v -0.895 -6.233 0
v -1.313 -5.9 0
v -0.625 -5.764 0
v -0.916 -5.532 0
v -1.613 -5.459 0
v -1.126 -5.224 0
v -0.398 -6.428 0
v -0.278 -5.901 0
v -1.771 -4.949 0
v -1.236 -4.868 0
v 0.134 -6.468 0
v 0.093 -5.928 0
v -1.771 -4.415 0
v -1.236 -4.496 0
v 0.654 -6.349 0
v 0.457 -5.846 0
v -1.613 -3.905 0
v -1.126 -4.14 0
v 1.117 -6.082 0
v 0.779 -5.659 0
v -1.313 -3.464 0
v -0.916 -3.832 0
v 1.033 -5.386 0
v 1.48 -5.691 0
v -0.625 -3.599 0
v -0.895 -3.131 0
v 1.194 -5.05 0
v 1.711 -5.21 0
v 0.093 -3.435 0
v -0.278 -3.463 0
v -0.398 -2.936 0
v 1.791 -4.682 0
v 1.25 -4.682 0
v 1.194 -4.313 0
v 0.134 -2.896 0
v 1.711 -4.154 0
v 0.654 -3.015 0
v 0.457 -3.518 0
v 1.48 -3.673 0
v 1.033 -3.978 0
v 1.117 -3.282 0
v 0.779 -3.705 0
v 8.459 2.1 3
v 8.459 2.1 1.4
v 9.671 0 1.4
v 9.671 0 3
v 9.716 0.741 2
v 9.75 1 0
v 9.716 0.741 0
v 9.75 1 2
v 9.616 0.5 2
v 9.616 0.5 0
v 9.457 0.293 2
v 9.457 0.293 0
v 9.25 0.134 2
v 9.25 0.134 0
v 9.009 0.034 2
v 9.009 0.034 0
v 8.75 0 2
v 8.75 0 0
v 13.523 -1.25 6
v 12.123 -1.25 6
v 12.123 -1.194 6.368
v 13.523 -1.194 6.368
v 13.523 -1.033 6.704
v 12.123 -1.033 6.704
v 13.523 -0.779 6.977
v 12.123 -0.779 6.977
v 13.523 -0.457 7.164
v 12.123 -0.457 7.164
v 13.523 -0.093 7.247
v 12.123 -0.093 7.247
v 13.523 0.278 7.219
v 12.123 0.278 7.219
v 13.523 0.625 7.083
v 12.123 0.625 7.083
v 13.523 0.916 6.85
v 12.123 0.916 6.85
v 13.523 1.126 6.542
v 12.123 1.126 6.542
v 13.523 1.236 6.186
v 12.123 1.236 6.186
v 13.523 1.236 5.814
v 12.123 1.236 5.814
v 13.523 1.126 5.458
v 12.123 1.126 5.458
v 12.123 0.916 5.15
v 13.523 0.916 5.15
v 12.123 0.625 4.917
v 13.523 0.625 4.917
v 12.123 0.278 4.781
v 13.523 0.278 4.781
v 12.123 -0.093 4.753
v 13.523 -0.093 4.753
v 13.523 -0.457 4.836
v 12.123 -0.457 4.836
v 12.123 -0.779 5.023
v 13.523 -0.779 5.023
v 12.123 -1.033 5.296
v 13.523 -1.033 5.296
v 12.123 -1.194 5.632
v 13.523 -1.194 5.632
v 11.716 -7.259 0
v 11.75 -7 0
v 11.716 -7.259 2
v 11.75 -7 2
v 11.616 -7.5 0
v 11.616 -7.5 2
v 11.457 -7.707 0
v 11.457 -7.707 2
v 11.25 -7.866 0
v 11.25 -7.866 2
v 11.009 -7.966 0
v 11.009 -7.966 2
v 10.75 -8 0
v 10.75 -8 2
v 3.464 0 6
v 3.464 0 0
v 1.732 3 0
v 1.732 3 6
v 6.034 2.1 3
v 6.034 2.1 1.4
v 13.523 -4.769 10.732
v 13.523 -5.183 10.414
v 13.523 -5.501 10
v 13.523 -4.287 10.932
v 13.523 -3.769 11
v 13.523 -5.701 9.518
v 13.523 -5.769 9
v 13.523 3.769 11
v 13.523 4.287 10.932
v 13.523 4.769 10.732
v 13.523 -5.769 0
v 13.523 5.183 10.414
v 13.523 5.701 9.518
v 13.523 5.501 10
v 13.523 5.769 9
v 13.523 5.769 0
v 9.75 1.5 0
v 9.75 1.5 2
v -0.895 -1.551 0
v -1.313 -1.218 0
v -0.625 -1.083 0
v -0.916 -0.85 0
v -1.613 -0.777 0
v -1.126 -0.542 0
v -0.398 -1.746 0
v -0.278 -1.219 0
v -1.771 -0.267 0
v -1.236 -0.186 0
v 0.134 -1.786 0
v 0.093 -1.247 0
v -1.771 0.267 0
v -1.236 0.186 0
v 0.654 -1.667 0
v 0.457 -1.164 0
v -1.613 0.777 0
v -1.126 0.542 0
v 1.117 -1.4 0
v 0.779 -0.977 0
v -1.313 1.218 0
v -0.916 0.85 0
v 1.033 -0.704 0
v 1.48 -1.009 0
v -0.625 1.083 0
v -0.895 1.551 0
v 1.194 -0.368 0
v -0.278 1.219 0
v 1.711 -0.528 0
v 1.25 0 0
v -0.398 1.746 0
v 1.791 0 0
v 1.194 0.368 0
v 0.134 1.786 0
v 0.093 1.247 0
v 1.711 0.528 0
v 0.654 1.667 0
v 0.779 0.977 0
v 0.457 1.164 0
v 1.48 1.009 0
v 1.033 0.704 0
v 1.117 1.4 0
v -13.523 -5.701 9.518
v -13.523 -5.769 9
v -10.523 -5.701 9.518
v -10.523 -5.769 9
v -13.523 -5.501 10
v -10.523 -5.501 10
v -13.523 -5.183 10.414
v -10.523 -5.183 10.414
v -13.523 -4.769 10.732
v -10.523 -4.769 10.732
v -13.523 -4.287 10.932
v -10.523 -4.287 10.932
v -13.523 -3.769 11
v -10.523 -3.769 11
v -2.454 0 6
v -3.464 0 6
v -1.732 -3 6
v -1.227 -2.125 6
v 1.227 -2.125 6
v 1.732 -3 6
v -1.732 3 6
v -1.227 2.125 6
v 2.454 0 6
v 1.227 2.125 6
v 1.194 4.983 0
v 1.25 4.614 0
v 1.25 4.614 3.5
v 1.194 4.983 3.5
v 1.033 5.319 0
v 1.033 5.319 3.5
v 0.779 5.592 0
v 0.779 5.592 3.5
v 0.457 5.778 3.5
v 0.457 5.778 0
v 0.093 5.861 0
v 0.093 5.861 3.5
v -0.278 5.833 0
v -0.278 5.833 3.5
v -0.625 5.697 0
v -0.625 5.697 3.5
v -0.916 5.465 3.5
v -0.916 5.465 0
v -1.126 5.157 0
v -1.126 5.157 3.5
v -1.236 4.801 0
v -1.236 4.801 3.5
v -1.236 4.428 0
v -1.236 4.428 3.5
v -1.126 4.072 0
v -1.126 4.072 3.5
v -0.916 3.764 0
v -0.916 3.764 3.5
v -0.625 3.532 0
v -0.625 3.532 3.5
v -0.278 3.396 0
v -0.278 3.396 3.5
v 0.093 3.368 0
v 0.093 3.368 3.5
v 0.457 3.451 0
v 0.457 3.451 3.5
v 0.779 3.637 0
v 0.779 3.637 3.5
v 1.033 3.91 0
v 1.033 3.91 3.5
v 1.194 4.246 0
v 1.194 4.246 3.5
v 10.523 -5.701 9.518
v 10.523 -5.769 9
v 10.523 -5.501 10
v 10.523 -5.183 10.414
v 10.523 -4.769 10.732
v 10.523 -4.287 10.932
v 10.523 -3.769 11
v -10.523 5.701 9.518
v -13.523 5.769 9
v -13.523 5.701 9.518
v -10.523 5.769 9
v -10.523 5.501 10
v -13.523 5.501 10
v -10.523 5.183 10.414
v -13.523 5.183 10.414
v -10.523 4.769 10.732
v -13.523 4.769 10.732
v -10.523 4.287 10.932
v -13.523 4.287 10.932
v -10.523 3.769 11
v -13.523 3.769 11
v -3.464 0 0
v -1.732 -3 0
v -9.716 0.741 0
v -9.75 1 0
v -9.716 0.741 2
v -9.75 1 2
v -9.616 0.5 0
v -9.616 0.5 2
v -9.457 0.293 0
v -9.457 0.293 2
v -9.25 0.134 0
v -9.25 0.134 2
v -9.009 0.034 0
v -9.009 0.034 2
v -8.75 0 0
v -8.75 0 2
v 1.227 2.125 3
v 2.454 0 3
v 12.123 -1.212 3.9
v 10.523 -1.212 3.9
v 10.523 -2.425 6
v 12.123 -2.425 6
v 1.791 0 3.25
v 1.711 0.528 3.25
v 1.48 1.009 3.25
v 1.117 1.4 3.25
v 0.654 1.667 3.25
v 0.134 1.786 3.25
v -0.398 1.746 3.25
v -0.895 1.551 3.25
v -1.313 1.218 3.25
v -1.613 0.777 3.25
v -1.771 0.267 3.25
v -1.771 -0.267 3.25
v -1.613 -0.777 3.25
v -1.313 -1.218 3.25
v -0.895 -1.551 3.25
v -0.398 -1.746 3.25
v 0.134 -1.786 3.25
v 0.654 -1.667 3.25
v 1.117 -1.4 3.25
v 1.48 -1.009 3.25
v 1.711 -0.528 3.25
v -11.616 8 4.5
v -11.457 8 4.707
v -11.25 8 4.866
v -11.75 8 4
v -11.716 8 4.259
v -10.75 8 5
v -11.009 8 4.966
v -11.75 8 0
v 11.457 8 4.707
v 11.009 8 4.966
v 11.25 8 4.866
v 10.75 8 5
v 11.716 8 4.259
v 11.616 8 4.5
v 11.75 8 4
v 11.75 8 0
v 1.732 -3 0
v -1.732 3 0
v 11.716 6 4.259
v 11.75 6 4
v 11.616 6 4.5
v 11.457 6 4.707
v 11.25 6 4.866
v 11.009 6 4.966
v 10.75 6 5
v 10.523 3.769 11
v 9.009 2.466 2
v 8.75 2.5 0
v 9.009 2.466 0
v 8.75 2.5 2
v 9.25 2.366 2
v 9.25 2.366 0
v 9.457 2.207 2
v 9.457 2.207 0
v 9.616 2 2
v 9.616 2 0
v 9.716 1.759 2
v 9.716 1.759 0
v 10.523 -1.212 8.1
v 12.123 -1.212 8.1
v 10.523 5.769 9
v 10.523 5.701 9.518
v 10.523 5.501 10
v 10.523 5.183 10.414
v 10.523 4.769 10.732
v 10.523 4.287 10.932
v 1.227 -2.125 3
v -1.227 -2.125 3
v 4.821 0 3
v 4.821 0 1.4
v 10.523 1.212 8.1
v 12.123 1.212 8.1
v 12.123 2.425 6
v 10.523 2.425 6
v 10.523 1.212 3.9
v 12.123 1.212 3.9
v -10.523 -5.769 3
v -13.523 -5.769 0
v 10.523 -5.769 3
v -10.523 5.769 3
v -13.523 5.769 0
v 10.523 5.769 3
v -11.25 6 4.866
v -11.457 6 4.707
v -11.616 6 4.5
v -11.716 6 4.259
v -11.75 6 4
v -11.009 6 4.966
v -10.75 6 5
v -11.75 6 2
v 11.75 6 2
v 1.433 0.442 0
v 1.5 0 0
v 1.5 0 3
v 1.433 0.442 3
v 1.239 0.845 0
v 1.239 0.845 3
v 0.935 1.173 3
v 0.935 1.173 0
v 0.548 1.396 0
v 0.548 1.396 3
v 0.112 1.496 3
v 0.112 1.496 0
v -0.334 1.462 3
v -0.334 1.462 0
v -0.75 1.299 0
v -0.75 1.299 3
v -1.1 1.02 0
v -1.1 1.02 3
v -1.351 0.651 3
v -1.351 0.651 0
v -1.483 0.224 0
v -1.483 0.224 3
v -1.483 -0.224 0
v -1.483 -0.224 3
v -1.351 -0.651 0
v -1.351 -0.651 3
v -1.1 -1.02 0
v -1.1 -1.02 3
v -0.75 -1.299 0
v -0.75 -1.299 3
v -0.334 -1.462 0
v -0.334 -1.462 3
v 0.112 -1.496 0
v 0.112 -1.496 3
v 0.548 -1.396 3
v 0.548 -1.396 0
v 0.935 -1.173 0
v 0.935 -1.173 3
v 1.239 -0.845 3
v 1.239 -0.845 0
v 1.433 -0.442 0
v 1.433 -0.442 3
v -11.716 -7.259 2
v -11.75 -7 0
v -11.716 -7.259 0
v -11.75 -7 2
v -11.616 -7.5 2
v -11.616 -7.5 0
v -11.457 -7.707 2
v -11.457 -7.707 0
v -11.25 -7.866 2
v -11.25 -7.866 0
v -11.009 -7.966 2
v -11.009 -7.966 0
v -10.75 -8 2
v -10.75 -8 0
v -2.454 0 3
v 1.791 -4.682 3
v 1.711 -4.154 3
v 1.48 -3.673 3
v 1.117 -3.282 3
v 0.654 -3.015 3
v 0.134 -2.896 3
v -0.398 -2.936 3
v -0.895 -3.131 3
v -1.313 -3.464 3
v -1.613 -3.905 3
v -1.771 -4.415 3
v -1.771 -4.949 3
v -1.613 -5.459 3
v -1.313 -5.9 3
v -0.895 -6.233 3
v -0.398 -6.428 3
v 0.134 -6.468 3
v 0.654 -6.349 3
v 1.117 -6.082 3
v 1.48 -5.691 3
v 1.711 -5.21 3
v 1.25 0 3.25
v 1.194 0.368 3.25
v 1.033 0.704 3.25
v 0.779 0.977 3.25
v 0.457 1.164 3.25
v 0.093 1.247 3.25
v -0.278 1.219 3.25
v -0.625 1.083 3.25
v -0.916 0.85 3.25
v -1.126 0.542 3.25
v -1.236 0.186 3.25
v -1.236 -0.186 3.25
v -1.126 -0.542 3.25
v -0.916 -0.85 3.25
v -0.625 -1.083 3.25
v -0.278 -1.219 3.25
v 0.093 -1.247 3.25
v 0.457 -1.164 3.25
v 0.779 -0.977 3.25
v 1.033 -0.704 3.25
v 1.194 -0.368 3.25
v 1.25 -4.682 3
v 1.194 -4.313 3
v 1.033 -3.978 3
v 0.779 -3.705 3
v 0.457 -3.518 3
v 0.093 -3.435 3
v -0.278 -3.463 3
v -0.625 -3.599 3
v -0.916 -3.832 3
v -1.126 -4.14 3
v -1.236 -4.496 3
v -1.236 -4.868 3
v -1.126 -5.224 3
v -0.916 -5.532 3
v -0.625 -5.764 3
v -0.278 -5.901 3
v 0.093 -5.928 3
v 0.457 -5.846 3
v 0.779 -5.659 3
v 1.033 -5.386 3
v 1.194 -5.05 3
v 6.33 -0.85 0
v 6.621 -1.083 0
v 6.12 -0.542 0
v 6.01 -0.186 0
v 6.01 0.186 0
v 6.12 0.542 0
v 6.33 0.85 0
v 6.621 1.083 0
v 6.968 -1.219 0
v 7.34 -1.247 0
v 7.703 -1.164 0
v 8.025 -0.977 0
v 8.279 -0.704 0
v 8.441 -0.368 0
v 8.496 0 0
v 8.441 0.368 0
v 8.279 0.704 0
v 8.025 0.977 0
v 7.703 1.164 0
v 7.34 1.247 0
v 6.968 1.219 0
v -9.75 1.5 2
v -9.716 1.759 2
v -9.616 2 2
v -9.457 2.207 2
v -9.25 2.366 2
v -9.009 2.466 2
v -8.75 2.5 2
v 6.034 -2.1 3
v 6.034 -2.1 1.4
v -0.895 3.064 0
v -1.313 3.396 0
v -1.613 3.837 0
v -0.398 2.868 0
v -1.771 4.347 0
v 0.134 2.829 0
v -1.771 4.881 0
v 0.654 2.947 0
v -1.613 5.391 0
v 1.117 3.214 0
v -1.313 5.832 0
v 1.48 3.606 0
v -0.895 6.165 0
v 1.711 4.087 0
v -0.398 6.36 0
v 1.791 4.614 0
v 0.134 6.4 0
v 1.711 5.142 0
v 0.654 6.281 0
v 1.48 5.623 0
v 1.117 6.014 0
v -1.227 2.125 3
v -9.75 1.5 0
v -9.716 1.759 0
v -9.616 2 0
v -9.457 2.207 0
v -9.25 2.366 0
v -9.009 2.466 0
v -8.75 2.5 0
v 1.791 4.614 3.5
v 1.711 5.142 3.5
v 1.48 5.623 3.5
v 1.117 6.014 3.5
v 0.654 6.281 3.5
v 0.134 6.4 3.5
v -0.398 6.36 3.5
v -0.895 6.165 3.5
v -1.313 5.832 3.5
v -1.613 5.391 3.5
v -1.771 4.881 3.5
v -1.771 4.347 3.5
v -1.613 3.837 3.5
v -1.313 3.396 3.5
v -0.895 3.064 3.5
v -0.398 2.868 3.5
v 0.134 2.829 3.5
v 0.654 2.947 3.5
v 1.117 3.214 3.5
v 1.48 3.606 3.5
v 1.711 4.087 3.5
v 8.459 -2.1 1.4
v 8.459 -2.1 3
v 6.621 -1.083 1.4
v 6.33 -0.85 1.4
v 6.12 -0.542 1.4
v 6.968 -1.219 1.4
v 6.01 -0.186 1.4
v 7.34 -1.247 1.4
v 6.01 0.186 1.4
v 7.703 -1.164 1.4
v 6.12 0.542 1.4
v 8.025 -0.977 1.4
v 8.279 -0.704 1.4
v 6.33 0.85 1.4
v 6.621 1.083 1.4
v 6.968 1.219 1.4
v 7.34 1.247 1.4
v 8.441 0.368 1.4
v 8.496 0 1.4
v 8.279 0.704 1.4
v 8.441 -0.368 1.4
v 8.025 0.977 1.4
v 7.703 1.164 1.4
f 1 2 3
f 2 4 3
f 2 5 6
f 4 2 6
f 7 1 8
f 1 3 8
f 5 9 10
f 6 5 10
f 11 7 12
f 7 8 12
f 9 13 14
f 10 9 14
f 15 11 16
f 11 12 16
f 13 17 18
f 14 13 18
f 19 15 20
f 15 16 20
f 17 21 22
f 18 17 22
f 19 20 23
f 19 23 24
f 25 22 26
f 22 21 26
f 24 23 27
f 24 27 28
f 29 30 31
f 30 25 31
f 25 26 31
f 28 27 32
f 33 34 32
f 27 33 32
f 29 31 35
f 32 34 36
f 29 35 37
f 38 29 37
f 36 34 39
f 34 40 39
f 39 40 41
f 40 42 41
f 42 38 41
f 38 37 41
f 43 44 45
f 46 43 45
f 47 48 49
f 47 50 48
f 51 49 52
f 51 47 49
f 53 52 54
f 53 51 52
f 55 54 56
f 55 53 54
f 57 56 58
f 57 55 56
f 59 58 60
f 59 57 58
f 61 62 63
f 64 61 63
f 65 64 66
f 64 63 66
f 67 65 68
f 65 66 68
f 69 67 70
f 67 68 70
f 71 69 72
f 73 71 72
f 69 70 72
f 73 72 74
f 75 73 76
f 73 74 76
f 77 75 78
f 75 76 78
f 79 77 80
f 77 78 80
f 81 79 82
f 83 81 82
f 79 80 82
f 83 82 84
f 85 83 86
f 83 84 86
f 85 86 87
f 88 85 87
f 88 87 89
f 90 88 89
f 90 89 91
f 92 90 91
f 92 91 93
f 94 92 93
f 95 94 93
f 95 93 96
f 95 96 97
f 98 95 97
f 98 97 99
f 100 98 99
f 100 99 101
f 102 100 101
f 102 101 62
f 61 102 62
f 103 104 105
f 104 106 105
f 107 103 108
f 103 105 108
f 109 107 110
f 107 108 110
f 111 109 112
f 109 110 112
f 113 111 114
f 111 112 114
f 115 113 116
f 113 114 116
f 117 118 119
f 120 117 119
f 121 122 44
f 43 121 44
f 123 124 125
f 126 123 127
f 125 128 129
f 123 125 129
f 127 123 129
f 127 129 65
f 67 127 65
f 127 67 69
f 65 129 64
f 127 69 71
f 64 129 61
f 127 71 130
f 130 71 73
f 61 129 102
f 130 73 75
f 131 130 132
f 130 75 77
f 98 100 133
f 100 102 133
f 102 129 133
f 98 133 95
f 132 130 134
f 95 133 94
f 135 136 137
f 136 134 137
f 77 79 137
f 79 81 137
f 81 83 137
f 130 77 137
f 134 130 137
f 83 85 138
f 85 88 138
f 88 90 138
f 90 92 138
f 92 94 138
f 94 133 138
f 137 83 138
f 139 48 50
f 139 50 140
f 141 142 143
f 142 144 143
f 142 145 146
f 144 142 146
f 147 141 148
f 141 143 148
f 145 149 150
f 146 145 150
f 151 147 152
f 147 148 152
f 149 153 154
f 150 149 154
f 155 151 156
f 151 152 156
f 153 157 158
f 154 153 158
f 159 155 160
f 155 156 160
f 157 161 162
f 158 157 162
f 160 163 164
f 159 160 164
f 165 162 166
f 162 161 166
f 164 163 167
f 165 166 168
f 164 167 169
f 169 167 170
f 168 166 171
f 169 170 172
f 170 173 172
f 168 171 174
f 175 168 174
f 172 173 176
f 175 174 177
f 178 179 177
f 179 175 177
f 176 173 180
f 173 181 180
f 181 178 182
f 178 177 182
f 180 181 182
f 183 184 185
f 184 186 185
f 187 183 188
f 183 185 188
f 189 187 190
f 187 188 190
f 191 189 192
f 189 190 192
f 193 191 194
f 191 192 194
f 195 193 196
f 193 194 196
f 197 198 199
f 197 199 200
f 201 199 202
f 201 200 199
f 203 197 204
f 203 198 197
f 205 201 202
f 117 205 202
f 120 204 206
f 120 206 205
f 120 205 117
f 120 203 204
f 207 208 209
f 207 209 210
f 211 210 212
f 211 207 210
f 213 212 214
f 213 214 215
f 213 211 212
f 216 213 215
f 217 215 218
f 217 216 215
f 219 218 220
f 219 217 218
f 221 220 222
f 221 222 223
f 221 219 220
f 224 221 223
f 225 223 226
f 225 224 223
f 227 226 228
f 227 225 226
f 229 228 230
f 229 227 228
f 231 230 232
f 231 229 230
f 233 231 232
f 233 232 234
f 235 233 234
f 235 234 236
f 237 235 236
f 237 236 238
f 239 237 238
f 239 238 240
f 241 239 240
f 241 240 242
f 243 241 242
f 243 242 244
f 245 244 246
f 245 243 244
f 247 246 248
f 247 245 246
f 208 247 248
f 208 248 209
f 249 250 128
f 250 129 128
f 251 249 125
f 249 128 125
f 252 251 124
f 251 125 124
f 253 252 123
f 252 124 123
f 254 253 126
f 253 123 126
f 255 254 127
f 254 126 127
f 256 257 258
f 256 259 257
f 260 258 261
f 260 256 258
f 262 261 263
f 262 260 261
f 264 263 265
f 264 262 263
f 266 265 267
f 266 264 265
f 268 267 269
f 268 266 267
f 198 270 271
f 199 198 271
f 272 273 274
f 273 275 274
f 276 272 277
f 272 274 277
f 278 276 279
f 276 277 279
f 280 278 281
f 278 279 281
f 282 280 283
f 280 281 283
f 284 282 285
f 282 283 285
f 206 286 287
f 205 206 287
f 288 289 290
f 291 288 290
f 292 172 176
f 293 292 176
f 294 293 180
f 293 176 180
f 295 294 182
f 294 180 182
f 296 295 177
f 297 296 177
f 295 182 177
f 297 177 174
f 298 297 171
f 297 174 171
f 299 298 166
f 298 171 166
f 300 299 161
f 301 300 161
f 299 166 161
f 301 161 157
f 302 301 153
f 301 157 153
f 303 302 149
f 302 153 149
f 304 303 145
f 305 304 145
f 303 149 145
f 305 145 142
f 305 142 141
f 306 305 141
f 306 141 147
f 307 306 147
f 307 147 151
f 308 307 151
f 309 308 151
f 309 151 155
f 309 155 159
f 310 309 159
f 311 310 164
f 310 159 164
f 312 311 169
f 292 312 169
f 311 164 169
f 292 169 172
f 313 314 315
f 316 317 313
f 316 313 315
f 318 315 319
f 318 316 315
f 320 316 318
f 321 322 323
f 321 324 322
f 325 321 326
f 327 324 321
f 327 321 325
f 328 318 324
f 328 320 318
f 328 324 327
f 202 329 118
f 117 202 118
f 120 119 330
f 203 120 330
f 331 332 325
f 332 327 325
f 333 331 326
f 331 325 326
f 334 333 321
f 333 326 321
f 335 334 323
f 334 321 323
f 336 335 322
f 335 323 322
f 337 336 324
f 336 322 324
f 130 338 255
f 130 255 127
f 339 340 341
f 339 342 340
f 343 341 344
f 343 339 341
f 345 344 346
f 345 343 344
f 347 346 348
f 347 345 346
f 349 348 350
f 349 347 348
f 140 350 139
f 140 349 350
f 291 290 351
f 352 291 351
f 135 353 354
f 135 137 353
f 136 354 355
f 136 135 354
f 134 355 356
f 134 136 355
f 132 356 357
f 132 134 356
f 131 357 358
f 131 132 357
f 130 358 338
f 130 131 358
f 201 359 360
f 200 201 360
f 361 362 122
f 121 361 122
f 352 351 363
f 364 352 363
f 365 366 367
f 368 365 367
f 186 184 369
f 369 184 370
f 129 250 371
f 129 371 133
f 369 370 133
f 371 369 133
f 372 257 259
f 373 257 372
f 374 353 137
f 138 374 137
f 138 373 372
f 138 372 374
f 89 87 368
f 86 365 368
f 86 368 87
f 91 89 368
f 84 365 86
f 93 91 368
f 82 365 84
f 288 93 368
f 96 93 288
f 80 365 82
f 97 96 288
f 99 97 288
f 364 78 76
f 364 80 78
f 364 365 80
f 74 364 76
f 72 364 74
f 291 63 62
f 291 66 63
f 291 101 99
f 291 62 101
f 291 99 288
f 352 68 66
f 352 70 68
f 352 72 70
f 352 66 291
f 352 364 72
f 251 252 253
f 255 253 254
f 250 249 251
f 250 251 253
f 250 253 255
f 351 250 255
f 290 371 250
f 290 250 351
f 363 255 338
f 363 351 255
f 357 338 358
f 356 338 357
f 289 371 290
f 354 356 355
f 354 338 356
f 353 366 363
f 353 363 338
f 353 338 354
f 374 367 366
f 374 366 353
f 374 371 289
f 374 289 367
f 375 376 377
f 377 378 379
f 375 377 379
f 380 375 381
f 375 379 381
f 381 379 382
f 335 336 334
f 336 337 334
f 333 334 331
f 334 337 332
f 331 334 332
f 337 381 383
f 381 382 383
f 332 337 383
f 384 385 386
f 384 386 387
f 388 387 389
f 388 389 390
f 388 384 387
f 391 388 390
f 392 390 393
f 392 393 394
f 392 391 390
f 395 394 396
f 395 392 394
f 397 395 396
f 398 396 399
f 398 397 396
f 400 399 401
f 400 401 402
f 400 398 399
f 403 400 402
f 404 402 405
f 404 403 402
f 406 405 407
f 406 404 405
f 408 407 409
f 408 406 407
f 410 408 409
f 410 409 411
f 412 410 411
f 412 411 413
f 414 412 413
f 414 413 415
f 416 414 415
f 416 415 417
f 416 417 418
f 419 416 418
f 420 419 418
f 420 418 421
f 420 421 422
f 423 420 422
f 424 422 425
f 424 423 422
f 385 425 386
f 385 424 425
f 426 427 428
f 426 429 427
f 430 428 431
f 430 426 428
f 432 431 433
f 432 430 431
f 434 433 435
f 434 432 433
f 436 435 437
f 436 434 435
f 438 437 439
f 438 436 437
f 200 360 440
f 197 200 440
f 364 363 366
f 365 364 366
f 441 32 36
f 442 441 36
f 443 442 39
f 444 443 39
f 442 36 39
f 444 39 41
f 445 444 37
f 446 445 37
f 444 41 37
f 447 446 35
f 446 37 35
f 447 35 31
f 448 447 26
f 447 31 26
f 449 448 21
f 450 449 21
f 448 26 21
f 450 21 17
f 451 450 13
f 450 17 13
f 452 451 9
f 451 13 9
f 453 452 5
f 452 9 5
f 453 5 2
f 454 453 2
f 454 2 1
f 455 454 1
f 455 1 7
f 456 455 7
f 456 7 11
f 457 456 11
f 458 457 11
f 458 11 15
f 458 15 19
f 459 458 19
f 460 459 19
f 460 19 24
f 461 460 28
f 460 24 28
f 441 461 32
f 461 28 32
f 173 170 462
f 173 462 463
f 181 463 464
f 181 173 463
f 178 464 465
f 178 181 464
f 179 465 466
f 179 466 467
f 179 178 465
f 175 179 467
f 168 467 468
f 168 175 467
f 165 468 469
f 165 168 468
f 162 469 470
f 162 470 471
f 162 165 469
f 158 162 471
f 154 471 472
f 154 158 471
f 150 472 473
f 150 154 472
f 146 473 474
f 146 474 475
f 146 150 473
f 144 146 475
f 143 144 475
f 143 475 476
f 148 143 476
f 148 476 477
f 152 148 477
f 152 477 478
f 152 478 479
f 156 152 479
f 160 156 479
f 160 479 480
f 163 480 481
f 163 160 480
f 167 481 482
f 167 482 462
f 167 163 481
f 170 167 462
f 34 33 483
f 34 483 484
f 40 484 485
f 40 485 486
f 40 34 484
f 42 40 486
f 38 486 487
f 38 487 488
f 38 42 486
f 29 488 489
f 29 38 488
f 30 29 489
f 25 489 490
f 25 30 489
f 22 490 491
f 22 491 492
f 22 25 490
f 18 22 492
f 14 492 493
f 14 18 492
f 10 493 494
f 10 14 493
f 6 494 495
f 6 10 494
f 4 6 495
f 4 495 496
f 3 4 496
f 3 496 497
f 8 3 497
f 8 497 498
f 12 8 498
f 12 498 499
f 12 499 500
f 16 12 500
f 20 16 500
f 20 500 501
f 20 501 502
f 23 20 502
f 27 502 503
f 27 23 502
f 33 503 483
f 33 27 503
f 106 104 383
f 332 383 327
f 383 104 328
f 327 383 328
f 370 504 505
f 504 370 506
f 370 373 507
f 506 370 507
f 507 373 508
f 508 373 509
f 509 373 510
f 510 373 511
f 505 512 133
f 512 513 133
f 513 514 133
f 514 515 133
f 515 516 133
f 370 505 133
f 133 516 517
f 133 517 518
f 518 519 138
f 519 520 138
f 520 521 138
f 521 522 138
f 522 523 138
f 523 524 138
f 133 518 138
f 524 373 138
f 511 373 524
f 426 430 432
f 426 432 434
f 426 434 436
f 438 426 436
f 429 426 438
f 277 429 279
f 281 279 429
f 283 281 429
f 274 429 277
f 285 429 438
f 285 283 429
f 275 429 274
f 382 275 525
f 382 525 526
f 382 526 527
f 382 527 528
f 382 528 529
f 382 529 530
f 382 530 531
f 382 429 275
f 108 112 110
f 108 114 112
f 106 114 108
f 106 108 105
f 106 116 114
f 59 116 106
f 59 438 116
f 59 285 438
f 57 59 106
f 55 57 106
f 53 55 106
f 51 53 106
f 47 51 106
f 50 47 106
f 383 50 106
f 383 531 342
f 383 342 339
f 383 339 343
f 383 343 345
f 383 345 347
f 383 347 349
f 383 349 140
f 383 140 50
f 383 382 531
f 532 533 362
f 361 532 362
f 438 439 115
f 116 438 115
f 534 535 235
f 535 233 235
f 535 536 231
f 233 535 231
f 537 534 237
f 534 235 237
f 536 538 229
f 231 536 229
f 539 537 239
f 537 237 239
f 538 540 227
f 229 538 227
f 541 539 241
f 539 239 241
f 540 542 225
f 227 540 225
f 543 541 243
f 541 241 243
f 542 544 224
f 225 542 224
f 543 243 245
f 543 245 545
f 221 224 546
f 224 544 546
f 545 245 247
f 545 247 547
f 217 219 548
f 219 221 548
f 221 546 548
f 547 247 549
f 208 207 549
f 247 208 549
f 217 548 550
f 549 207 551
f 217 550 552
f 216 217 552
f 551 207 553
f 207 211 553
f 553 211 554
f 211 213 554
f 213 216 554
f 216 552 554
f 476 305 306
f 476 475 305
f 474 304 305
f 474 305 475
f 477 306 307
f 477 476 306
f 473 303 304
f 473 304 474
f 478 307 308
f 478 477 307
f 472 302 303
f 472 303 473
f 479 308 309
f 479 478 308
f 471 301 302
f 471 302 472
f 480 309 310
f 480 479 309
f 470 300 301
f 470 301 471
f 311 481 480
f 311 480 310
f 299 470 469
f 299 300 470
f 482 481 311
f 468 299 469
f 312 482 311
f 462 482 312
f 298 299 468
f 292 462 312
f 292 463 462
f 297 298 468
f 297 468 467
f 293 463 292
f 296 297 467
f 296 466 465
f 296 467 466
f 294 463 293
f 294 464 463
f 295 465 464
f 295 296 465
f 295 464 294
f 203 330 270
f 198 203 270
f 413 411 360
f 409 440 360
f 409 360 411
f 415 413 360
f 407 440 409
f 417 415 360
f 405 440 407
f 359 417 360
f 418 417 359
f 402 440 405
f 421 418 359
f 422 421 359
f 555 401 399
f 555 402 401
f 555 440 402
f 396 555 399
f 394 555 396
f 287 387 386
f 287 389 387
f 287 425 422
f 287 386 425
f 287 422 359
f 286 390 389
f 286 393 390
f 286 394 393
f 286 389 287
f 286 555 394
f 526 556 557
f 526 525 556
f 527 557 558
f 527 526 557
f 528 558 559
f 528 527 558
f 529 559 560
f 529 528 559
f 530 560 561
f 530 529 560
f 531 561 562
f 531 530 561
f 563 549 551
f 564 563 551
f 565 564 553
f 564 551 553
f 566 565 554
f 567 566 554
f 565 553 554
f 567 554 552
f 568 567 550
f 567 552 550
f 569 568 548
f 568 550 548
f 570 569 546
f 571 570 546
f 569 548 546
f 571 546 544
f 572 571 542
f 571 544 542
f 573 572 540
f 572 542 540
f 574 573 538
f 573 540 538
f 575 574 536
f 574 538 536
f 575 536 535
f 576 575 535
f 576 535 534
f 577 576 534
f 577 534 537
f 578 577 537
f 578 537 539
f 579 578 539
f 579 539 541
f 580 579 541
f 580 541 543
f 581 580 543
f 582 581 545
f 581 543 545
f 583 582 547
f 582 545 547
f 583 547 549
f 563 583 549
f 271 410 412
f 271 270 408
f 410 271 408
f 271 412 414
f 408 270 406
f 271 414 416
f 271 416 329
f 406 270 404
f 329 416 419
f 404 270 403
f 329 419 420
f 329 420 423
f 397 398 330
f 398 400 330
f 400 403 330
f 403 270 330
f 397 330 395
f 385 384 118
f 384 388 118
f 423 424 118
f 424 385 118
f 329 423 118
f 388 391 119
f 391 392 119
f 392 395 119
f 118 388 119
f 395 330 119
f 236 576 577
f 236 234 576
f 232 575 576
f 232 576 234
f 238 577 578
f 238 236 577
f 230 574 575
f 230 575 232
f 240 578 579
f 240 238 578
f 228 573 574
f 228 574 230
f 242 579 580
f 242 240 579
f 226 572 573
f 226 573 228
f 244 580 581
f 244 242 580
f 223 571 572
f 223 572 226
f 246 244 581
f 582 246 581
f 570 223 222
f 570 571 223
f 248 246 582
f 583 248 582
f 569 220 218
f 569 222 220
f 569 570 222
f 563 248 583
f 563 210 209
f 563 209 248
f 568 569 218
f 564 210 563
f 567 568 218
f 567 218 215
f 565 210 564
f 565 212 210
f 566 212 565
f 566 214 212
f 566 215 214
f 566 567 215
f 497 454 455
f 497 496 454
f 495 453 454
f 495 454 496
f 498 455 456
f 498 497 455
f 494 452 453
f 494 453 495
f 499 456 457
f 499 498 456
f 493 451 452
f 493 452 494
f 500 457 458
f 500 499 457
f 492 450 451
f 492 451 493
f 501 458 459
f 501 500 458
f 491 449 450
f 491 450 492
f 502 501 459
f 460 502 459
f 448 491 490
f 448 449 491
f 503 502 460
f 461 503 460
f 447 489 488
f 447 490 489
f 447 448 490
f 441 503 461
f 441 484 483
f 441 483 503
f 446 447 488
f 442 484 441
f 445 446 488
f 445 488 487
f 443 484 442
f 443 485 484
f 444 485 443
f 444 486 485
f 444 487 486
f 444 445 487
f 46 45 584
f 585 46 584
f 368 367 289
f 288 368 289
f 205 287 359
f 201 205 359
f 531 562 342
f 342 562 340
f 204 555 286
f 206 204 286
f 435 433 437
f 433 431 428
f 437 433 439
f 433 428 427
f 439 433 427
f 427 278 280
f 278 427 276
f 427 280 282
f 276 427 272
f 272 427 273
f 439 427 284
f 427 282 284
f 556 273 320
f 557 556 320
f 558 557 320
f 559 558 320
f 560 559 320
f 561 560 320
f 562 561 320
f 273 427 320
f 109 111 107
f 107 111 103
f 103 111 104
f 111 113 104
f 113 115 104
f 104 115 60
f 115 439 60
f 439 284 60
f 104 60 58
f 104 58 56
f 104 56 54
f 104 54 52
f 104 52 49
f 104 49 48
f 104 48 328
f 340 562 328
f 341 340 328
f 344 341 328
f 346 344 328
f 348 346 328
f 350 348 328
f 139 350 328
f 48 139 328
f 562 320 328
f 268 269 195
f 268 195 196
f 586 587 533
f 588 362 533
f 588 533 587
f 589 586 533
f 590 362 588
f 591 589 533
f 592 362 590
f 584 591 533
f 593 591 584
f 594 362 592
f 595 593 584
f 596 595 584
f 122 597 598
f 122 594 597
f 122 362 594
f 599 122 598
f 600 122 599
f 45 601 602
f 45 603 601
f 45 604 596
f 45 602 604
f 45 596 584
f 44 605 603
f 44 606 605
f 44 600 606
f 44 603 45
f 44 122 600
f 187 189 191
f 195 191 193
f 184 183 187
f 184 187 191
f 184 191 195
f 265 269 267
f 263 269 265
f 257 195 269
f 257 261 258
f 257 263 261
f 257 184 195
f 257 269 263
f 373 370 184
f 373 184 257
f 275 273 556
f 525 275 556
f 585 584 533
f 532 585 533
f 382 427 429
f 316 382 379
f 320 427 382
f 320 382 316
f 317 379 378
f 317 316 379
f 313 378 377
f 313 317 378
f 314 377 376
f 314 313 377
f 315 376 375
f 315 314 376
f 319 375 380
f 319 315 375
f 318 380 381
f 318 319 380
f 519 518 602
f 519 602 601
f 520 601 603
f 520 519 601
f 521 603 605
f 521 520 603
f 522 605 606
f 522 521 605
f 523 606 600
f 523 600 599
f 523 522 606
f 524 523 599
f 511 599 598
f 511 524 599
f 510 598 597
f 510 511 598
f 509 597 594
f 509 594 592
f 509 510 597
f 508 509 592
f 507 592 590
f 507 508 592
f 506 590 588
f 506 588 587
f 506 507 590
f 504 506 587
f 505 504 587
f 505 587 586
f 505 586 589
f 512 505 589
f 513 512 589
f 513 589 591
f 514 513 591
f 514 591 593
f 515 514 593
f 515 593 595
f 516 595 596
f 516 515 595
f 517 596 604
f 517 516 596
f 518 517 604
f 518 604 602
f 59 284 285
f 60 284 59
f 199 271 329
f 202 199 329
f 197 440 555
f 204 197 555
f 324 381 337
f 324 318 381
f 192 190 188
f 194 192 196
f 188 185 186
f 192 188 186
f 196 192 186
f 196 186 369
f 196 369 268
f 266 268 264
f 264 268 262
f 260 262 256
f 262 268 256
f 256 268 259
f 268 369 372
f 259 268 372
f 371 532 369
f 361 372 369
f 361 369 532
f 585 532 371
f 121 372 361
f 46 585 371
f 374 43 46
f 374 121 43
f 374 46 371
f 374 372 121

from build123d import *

# Parameters (mm, degrees)
F0_W      = 23.5
F0_H      = 14
F0_W_2    = 19.5
F0_H_2    = 2.5
F1_DEPTH  = 2
F0_H_3    = 2
F2_DEPTH  = 5
F3_R      = 1
F4_W      = 21.0458148676
F4_H      = 11.5377975056
F5_DEPTH  = 3
F4_W_2    = 3
F6_DEPTH  = 11
F4_R      = 1.25
F8_DEPTH  = 1.4
F7_R      = 1.25
F9_DEPTH  = 3.001
F10_DEPTH = 1.6
F11_R     = 2
F12_R     = 1.7907796981
F12_R_2   = 1.25
F13_DEPTH = 3.5
F14_DEPTH = 3.25
F15_DEPTH = 3
F16_R     = 1.5
F17_DEPTH = 3
F18_DEPTH = 6


with BuildPart() as f1:
    # F0 (on Top) → F1 (new body)
    with BuildSketch(Plane.XY):
        with Locations((0, -1)):
            Rectangle(F0_W, F0_H)
        with Locations((0, 1.25)):
            Rectangle(F0_W_2, F0_H_2, mode=Mode.SUBTRACT)
    extrude(amount=F1_DEPTH)

    # F0 (on Top) → F2 (join)
    with BuildSketch(Plane.XY):
        with Locations((0, 7)):
            Rectangle(F0_W, F0_H_3)
    extrude(amount=F2_DEPTH)

    # F3
    f3_edges = [f1.edges().sort_by_distance(p)[0] for p in [
        (-9.75, 2.5, 1),
        (-9.75, 0, 1),
        (9.75, 2.5, 1),
        (9.75, 0, 1),
        (11.75, 7, 5),
        (-11.75, 7, 5),
        (-11.75, -8, 1),
        (11.75, -8, 1),
    ]]
    fillet(f3_edges, radius=F3_R)


with BuildPart() as f5:
    # F4 (on Top) → F5 (new body)
    with BuildSketch(Plane.XY):
        Rectangle(F4_W, F4_H)
        Polygon((9.6710080965, 0), (8.4585725312, -2.1), (6.0337014006, -2.1), (4.8212658353, 0), (6.0337014006, 2.1), (8.4585725312, 2.1), align=None, mode=Mode.SUBTRACT)
    extrude(amount=F5_DEPTH)

    # F4 (on Top) → F6 (join)
    with BuildSketch(Plane.XY):
        with Locations((-12.0229074338, 0)):
            Rectangle(F4_W_2, F4_H)
        with Locations((12.0229074338, 0)):
            Rectangle(F4_W_2, F4_H)
    extrude(amount=F6_DEPTH)

    # F4 (on Top) → F8 (join)
    with BuildSketch(Plane.XY):
        Polygon((6.0337014006, -2.1), (8.4585725312, -2.1), (9.6710080965, 0), (8.4585725312, 2.1), (6.0337014006, 2.1), (4.8212658353, 0), align=None)
        with Locations((7.2461369659, 0)):
            Circle(F4_R, mode=Mode.SUBTRACT)
    extrude(amount=F8_DEPTH)

    # F7 (on face) → F9 (cut, through all)
    with BuildSketch(Plane(origin=(10.5229074338, 0, 0), x_dir=(0, -1, 0), z_dir=(-1, 0, 0))):
        with Locations((0, 6)):
            Circle(F7_R)
    extrude(amount=-F9_DEPTH, mode=Mode.SUBTRACT)

    # F7 (on face) → F10 (cut)
    with BuildSketch(Plane(origin=(10.5229074338, 0, 0), x_dir=(0, -1, 0), z_dir=(-1, 0, 0))):
        Polygon((-1.2124355653, 3.9), (1.2124355653, 3.9), (2.4248711306, 6), (1.2124355653, 8.1), (-1.2124355653, 8.1), (-2.4248711306, 6), align=None)
        with Locations((0, 6)):
            Circle(F7_R, mode=Mode.SUBTRACT)
    extrude(amount=-F10_DEPTH, mode=Mode.SUBTRACT)

    # F11
    f11_edges = [f5.edges().sort_by_distance(p)[0] for p in [
        (-12.022907, -5.768899, 11),
        (12.022907, -5.768899, 11),
        (12.022907, 5.768899, 11),
        (-12.022907, 5.768899, 11),
    ]]
    fillet(f11_edges, radius=F11_R)


with BuildPart() as f13:
    # F12 (on Top) → F13 (new body)
    with BuildSketch(Plane.XY):
        with Locations((0, 4.6143797226)):
            Circle(F12_R)
        with Locations((0, 4.6143797226)):
            Circle(F12_R_2, mode=Mode.SUBTRACT)
    extrude(amount=F13_DEPTH)


with BuildPart() as f14:
    # F12 (on Top) → F14 (new body)
    with BuildSketch(Plane.XY):
        Circle(F12_R)
        Circle(F12_R_2, mode=Mode.SUBTRACT)
    extrude(amount=F14_DEPTH)


with BuildPart() as f15:
    # F12 (on Top) → F15 (new body)
    with BuildSketch(Plane.XY):
        with Locations((0, -4.6819411218)):
            Circle(F12_R)
        with Locations((0, -4.6819411218)):
            Circle(F12_R_2, mode=Mode.SUBTRACT)
    extrude(amount=F15_DEPTH)


with BuildPart() as f17:
    # F16 (on Top) → F17 (new body)
    with BuildSketch(Plane.XY):
        Polygon((-1.7320508076, 3), (-3.4641016151, 0), (-1.7320508076, -3), (1.7320508076, -3), (3.4641016151, 0), (1.7320508076, 3), align=None)
        Polygon((-1.226869322, -2.125), (-2.4537386441, 0), (-1.226869322, 2.125), (1.226869322, 2.125), (2.4537386441, 0), (1.226869322, -2.125), align=None, mode=Mode.SUBTRACT)
        Polygon((-1.226869322, 2.125), (-2.4537386441, 0), (-1.226869322, -2.125), (1.226869322, -2.125), (2.4537386441, 0), (1.226869322, 2.125), align=None)
        Circle(F16_R, mode=Mode.SUBTRACT)
    extrude(amount=F17_DEPTH)

    # F16 (on Top) → F18 (join)
    with BuildSketch(Plane.XY):
        Polygon((-1.7320508076, 3), (-3.4641016151, 0), (-1.7320508076, -3), (1.7320508076, -3), (3.4641016151, 0), (1.7320508076, 3), align=None)
        Polygon((-1.226869322, -2.125), (-2.4537386441, 0), (-1.226869322, 2.125), (1.226869322, 2.125), (2.4537386441, 0), (1.226869322, -2.125), align=None, mode=Mode.SUBTRACT)
    extrude(amount=F18_DEPTH)


solid = Compound([f1.part, f5.part, f13.part, f14.part, f15.part, f17.part])
